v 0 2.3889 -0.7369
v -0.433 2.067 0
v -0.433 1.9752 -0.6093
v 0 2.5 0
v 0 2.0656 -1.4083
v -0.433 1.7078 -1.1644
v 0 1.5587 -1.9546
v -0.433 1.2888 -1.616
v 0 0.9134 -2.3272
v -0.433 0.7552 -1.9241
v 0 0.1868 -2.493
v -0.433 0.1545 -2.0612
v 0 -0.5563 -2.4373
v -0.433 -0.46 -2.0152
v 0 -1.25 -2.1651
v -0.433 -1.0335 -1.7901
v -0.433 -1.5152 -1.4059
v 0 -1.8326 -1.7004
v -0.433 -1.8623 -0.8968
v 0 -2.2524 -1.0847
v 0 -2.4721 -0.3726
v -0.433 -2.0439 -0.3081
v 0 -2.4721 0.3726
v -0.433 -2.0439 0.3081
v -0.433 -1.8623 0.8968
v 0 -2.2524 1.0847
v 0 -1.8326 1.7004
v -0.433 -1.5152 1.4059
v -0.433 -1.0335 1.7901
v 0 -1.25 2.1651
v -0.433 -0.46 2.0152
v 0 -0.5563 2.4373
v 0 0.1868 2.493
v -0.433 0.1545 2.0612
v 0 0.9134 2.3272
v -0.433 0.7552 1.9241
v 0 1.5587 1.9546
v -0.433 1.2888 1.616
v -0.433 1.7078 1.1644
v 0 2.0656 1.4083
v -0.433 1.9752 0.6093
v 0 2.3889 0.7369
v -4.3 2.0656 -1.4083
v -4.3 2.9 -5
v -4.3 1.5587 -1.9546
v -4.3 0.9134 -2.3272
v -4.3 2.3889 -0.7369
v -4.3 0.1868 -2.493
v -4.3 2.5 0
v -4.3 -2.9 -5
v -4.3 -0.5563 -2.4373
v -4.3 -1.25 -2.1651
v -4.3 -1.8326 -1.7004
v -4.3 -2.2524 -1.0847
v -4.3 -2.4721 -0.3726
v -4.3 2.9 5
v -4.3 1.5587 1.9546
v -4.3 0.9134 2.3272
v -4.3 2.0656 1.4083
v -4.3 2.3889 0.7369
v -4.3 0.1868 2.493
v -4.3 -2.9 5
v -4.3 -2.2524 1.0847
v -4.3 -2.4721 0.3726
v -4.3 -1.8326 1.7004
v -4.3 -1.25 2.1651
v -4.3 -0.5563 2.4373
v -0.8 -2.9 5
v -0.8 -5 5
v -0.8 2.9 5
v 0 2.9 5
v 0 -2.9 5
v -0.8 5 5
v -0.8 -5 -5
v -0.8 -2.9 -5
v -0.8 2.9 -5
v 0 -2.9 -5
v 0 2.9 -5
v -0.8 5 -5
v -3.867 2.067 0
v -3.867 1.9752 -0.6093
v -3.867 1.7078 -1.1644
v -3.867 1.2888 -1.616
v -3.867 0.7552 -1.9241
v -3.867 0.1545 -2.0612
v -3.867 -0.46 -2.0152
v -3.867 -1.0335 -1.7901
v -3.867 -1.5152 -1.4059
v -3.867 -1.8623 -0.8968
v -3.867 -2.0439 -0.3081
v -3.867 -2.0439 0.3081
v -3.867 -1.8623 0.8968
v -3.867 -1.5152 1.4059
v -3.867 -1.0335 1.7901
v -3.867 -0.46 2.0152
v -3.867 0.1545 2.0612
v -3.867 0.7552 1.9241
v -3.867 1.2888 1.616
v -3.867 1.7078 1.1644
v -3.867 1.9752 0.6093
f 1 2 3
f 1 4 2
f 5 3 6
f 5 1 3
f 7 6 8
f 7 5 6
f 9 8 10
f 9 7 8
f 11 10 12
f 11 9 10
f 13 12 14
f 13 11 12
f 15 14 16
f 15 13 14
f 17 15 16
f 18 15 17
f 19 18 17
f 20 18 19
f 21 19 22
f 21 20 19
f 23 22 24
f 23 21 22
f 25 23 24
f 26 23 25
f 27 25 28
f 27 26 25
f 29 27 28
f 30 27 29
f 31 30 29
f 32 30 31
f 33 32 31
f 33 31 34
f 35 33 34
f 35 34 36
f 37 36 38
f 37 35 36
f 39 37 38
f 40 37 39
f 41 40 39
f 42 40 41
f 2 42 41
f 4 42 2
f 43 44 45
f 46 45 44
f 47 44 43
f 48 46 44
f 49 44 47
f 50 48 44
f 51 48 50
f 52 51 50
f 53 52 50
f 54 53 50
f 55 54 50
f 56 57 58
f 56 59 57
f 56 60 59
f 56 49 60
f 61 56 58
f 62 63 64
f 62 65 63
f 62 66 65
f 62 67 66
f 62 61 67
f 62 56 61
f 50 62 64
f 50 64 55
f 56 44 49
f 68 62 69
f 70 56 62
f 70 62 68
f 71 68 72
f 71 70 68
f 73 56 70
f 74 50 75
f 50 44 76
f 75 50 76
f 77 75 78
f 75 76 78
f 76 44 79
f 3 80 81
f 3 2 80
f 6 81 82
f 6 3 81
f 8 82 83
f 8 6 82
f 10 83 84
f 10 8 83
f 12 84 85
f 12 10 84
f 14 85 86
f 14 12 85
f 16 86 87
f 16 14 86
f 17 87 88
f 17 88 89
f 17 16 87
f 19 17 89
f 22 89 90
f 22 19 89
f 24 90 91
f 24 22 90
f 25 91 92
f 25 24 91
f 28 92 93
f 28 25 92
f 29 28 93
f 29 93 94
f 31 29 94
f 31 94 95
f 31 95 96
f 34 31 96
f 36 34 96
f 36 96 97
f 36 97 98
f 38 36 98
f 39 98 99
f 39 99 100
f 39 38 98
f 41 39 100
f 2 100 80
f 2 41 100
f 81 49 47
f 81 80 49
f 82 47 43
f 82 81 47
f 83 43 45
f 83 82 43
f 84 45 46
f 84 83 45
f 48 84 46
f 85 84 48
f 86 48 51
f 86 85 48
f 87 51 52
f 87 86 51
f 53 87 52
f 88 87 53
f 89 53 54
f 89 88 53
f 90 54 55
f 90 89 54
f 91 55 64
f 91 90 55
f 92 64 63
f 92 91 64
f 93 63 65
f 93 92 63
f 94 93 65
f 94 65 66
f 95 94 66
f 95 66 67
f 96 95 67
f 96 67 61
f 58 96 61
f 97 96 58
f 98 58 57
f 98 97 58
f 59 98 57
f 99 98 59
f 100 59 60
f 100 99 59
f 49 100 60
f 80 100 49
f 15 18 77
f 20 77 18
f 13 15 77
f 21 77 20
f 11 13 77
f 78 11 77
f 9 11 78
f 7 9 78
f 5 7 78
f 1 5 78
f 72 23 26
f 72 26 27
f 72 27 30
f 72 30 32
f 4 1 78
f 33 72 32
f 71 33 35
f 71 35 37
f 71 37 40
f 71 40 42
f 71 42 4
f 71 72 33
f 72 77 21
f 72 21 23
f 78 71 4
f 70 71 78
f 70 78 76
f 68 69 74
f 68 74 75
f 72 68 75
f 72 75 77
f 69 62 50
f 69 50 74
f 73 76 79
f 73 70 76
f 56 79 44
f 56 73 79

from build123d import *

# Parameters (mm, degrees)
BOSS_EXTRUDE1_DEPTH      = 5
BOSS_EXTRUDE1_DEPTH_BACK = 5


with BuildPart() as part:
    # Sketch1 → Boss-Extrude1 (new body, two sides)
    with BuildSketch(Plane.XY) as boss_extrude1_sk:
        Polygon((-4.3, 2.9), (-4.3, -2.9), (-0.8, -5), (-0.8, -2.9), (0, -2.9), (0, 2.9), (-0.8, 2.9), (-0.8, 5), align=None)
    extrude(amount=BOSS_EXTRUDE1_DEPTH)
    extrude(boss_extrude1_sk.sketch, amount=-BOSS_EXTRUDE1_DEPTH_BACK)

    # Sketch2 → Cut-Revolve1 (revolve, cut)
    with BuildSketch(Plane.XY):
        Polygon((-4.3, 0), (-4.3, 2.5), (-3.867, 2.067), (-0.433, 2.067), (0, 2.5), (0, 0), align=None)
    revolve(axis=Axis((0, 0, 0), (-1, 0, 0)), mode=Mode.SUBTRACT)


solid = part.part
